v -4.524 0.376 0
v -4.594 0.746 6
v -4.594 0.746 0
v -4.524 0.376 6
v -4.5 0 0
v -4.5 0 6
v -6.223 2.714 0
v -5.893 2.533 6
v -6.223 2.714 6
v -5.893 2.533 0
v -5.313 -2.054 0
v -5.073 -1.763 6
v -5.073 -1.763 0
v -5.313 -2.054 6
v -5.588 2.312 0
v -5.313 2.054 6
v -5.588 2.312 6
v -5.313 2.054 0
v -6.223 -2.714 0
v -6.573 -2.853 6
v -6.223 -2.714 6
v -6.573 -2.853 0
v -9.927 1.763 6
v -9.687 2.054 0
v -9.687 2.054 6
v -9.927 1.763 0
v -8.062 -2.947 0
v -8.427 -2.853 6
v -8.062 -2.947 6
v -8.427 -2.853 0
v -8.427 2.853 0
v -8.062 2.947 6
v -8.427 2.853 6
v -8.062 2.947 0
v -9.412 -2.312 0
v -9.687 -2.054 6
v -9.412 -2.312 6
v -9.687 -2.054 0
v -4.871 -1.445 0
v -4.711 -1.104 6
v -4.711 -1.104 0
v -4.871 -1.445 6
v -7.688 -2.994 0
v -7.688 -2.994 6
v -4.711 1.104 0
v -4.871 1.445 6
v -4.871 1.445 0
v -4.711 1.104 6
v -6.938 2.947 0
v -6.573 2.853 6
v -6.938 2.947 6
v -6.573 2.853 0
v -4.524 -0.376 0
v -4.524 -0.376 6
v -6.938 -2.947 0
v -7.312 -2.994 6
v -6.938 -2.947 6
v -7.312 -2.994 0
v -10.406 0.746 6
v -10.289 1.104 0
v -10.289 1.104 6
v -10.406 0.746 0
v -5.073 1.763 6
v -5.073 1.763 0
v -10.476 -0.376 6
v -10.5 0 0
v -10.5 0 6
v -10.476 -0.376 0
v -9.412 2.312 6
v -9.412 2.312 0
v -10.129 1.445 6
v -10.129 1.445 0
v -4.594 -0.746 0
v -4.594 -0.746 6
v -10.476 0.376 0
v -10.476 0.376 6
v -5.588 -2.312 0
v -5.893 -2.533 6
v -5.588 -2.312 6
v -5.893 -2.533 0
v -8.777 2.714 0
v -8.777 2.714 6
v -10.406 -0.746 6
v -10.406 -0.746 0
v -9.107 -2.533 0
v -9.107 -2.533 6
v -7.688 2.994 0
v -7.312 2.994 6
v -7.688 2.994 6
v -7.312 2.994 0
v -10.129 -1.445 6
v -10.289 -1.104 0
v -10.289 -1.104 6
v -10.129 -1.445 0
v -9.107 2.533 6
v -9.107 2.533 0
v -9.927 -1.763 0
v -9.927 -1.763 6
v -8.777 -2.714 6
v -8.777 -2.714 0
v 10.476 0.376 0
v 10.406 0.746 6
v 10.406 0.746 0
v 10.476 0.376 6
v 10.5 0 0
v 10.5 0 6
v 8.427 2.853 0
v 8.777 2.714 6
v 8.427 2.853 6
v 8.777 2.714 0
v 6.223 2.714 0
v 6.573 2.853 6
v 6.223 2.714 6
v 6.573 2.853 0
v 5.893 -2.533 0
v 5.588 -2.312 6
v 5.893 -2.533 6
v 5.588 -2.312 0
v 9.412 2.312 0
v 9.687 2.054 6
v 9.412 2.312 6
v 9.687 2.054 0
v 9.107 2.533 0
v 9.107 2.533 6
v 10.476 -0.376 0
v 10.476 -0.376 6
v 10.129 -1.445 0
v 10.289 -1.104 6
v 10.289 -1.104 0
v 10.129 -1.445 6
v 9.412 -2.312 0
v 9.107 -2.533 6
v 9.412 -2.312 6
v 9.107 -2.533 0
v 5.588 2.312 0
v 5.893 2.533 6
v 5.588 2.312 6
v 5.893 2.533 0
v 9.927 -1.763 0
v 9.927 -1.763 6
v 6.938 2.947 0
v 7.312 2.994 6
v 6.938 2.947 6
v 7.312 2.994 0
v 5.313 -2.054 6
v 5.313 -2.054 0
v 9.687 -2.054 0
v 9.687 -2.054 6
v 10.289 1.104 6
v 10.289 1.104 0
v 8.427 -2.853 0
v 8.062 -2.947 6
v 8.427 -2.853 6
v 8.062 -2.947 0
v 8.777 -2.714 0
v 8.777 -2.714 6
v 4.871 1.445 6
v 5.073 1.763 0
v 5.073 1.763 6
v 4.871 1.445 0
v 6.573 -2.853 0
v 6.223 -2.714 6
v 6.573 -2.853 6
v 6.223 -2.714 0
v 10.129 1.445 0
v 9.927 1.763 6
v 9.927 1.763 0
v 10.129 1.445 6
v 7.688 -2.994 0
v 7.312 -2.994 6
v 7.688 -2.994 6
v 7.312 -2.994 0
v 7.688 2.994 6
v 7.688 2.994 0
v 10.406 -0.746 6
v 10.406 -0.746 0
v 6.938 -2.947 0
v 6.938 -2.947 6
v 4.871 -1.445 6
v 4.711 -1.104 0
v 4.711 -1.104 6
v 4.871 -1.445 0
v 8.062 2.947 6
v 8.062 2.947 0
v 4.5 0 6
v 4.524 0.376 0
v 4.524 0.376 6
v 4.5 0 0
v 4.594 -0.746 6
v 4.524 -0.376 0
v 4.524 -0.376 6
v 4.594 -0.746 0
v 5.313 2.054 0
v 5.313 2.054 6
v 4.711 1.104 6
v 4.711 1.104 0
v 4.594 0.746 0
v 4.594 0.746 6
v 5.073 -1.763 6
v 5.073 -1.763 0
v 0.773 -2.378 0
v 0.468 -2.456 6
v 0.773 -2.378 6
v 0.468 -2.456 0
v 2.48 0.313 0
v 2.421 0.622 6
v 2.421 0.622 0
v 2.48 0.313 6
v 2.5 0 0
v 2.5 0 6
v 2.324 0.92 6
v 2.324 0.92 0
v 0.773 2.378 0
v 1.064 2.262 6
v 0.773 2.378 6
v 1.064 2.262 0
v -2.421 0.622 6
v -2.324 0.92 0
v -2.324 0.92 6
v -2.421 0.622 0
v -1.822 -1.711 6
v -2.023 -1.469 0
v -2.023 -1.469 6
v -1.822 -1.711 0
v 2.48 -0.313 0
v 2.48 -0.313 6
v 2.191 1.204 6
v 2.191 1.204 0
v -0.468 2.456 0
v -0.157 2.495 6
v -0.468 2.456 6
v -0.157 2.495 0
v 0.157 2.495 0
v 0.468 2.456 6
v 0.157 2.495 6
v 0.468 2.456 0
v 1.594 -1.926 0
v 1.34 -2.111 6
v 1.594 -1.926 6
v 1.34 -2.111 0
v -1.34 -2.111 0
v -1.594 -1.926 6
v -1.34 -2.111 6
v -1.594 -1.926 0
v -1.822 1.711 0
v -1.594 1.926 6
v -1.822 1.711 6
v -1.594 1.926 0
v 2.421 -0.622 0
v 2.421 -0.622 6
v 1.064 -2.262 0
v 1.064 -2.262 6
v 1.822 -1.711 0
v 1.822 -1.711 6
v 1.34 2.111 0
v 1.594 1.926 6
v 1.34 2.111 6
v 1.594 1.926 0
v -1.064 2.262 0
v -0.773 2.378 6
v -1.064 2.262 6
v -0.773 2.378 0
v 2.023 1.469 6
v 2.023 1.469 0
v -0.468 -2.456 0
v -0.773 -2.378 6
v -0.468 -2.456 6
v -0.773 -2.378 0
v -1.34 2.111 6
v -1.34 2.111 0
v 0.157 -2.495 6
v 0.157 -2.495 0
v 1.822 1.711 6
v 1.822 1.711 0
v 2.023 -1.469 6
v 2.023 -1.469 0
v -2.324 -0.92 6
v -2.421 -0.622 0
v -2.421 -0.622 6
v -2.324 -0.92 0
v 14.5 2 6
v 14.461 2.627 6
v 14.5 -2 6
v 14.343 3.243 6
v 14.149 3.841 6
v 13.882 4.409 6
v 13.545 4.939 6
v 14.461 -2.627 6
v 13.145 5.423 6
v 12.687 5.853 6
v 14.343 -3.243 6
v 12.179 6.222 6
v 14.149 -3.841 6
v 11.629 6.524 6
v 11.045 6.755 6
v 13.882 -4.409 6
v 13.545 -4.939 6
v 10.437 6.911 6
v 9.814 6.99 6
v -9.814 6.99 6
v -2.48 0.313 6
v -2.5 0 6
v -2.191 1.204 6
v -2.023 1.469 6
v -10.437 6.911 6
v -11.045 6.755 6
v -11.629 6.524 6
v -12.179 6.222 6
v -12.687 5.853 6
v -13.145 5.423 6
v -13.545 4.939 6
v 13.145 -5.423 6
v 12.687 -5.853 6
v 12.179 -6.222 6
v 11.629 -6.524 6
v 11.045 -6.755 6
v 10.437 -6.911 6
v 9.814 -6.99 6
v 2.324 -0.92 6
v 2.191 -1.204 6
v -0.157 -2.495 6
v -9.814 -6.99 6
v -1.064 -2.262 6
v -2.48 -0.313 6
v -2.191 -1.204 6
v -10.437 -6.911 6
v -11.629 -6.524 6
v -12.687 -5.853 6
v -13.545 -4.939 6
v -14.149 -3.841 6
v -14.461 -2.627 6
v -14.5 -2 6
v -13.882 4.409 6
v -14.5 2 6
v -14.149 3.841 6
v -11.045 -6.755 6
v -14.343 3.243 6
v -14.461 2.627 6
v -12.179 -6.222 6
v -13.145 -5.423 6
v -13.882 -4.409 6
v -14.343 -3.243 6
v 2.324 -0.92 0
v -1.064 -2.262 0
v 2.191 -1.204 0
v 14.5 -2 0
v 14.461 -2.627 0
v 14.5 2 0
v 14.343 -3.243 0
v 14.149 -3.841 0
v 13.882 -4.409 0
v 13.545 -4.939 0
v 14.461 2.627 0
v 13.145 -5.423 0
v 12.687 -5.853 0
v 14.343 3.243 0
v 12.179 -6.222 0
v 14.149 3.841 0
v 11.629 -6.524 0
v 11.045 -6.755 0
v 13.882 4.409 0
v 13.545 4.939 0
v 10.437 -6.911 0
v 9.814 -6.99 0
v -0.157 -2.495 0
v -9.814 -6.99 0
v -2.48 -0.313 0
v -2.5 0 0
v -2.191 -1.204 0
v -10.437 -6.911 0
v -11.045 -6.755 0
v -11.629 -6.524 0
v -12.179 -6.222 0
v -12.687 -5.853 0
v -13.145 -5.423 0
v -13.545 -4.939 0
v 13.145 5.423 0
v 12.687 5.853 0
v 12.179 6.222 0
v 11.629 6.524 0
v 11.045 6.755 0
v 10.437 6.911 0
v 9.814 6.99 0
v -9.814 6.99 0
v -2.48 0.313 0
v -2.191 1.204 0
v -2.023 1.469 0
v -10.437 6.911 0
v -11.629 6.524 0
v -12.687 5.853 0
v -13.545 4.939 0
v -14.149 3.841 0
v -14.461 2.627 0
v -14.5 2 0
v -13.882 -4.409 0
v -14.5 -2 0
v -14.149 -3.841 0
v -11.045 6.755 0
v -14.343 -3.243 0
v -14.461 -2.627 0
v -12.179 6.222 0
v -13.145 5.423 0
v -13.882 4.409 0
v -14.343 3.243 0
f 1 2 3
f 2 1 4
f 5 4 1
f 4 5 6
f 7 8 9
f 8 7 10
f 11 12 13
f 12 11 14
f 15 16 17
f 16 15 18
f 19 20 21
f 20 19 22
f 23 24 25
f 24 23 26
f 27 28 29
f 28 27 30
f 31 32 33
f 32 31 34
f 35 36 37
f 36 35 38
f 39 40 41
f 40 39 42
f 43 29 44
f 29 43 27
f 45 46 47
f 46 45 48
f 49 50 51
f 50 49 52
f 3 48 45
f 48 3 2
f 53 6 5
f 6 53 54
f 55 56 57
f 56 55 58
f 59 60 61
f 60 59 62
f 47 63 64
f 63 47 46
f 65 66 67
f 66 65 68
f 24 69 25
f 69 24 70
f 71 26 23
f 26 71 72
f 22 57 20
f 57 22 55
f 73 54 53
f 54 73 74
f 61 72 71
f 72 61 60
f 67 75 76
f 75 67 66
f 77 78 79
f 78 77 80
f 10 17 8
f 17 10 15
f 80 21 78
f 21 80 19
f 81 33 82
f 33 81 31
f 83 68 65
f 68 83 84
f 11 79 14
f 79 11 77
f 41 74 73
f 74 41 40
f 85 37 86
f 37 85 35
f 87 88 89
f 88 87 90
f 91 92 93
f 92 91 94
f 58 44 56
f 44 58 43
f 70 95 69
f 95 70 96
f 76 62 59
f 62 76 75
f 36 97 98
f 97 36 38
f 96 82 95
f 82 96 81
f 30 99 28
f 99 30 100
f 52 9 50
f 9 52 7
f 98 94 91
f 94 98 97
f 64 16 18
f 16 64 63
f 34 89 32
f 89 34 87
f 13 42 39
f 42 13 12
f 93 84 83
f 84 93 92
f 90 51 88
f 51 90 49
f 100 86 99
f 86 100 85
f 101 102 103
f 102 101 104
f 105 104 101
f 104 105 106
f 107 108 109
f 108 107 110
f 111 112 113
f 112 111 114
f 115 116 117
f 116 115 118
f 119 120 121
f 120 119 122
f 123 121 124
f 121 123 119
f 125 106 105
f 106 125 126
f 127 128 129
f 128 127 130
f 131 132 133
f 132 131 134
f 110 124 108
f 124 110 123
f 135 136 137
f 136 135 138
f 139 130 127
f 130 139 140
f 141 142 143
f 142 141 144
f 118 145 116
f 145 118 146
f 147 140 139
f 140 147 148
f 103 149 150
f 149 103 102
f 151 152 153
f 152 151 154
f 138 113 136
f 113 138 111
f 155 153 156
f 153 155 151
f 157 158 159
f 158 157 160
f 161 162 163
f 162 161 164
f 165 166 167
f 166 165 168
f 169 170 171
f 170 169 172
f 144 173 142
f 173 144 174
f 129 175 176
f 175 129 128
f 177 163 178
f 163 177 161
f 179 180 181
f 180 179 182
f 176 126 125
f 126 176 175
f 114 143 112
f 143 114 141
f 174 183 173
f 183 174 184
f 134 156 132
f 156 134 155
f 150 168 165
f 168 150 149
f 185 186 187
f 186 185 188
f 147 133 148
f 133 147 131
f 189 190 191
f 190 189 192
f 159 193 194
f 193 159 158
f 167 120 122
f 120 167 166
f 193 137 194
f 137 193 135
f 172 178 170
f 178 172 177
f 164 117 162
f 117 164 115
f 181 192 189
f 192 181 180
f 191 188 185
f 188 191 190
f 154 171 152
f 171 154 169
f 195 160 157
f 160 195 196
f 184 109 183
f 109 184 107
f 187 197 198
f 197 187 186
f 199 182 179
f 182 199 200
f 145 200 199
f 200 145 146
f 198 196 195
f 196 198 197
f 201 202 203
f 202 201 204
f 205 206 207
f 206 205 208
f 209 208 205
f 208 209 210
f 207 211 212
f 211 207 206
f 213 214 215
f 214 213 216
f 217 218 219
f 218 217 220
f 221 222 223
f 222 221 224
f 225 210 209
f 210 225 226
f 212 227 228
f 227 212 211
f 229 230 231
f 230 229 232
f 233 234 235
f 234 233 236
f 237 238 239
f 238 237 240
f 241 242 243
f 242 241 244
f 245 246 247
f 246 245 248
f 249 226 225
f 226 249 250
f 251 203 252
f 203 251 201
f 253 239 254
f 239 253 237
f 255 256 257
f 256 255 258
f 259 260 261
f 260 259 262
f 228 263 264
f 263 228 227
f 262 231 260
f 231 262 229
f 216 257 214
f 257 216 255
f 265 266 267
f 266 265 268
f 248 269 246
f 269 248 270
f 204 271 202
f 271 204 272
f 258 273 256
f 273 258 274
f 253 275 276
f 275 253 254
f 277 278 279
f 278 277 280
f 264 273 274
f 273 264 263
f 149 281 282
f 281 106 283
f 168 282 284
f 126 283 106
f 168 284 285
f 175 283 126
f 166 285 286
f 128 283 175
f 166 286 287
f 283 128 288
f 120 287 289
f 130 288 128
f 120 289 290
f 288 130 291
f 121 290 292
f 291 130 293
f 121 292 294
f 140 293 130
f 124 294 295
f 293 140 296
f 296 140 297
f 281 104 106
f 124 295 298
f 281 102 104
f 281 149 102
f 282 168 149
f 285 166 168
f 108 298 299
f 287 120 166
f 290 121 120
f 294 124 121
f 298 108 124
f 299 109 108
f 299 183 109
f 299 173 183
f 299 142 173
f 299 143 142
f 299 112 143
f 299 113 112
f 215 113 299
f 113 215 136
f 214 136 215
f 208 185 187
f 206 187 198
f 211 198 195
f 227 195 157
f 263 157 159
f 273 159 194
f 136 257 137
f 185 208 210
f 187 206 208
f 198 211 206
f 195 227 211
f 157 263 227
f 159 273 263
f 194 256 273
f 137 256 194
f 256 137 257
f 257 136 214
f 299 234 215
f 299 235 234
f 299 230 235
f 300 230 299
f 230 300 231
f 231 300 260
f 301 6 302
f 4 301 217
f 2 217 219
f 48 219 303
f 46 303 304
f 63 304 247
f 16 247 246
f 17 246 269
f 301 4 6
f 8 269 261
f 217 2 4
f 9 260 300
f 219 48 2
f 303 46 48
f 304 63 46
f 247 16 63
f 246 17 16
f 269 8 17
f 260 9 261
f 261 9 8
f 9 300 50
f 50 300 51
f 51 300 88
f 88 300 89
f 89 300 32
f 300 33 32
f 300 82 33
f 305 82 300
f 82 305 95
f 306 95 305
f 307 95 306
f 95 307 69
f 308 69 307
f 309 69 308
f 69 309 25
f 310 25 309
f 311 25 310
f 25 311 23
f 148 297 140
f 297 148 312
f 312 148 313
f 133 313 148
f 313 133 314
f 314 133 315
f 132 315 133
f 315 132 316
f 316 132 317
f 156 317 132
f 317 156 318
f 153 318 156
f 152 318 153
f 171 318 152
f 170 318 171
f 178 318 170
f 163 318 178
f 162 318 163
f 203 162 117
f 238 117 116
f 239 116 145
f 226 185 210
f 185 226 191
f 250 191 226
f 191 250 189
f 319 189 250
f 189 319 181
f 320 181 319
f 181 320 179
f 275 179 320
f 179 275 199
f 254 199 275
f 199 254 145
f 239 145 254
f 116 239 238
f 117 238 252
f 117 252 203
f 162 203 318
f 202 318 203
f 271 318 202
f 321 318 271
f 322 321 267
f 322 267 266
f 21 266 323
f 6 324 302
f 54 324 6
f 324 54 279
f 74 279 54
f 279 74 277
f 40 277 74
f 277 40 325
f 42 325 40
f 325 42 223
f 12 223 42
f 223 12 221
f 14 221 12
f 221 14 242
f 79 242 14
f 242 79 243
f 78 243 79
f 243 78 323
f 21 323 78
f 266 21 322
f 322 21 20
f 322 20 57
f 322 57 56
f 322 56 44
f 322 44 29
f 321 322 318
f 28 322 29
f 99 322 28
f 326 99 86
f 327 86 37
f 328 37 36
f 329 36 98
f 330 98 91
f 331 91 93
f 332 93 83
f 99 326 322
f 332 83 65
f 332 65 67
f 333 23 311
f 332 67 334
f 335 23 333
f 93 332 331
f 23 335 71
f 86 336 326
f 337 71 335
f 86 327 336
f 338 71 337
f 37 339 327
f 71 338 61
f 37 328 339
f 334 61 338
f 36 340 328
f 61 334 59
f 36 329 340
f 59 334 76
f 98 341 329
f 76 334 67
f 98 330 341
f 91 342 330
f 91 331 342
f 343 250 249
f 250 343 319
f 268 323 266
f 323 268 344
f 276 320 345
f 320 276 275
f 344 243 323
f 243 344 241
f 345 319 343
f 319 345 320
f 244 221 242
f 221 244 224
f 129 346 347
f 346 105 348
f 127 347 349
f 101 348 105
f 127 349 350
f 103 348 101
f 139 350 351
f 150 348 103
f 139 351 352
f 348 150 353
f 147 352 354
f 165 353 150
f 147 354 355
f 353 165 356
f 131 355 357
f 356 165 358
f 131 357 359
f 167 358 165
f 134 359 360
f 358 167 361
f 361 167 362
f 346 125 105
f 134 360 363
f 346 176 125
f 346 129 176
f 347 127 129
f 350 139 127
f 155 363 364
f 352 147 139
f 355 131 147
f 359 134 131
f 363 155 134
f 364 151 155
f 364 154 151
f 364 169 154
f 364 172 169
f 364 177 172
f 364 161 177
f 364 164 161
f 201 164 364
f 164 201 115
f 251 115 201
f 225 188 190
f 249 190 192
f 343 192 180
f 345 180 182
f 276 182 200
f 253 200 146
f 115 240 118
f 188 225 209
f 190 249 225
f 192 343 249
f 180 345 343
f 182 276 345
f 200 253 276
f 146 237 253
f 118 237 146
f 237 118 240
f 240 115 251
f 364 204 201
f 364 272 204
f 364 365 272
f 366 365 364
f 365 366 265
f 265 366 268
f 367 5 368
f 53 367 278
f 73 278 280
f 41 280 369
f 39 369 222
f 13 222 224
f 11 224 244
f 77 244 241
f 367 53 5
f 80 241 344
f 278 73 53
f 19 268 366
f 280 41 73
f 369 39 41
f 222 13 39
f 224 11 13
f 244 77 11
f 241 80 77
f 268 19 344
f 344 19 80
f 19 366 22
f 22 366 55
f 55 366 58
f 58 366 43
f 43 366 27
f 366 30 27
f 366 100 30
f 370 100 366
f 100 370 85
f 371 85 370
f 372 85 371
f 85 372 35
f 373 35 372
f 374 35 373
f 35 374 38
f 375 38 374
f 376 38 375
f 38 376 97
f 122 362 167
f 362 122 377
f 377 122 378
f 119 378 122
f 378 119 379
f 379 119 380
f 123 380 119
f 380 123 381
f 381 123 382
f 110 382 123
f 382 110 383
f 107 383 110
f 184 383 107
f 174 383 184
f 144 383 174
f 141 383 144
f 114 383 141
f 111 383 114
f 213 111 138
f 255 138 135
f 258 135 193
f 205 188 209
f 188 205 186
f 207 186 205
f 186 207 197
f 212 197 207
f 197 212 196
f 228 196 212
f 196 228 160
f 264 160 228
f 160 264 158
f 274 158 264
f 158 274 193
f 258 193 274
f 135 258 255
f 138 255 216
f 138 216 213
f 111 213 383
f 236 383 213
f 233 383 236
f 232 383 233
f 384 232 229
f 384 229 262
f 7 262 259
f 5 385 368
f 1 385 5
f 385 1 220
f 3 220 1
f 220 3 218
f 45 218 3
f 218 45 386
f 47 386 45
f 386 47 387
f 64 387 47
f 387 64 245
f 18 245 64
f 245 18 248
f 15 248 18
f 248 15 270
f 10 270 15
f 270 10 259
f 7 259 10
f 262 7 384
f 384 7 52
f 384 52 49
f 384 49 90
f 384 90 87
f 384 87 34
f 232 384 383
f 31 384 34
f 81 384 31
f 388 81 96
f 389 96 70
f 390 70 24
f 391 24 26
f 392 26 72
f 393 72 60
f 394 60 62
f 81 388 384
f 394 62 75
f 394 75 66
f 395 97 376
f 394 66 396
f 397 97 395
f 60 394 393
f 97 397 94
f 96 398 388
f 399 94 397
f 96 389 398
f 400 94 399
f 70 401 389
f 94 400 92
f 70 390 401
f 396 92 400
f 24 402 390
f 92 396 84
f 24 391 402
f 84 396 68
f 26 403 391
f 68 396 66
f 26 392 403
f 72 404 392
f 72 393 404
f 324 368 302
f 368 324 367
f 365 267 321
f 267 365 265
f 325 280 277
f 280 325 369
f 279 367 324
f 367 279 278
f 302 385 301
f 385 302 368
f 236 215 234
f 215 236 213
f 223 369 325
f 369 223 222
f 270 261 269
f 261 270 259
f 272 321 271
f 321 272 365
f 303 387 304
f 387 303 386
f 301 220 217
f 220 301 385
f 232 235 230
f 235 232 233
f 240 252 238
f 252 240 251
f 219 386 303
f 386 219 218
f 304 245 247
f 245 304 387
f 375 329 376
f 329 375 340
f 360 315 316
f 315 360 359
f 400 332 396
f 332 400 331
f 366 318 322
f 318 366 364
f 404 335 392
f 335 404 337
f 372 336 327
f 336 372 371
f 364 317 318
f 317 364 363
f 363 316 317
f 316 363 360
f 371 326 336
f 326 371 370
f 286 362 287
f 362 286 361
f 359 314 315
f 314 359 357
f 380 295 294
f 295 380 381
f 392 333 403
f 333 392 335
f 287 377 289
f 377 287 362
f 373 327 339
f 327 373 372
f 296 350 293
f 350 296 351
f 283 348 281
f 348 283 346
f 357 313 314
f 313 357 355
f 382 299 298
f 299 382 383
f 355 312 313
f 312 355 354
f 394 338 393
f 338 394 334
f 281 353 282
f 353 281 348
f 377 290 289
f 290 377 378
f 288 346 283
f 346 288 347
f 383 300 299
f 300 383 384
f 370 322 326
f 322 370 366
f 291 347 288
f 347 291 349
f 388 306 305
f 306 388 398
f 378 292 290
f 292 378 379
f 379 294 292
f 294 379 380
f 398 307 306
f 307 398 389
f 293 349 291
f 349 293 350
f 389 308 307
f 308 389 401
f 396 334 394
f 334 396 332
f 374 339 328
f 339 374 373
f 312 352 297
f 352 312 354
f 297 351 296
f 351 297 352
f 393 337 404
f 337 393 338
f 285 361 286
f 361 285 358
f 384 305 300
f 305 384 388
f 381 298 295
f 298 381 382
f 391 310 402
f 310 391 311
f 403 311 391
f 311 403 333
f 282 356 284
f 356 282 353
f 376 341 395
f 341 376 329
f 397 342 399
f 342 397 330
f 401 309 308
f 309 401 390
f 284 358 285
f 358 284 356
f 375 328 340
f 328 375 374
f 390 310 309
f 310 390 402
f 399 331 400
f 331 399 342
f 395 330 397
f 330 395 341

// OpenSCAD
$fn = 50;


difference() {
	union() {
		hull() {
			translate(v = [-9.5000000000, 2.0000000000, 0]) {
				cylinder(h = 6, r = 5);
			}
			translate(v = [9.5000000000, 2.0000000000, 0]) {
				cylinder(h = 6, r = 5);
			}
			translate(v = [-9.5000000000, -2.0000000000, 0]) {
				cylinder(h = 6, r = 5);
			}
			translate(v = [9.5000000000, -2.0000000000, 0]) {
				cylinder(h = 6, r = 5);
			}
		}
	}
	union() {
		#translate(v = [-7.5000000000, 0.0000000000, 0]) {
			cylinder(h = 6, r = 3.0000000000);
		}
		#translate(v = [7.5000000000, 0.0000000000, 0]) {
			cylinder(h = 6, r = 3.0000000000);
		}
		#translate(v = [-7.5000000000, 0.0000000000, -100.0000000000]) {
			cylinder(h = 200, r = 3.0000000000);
		}
		#translate(v = [-7.5000000000, 0.0000000000, -100.0000000000]) {
			cylinder(h = 200, r = 3.0000000000);
		}
		#translate(v = [7.5000000000, 0.0000000000, -100.0000000000]) {
			cylinder(h = 200, r = 3.0000000000);
		}
		#translate(v = [7.5000000000, 0.0000000000, -100.0000000000]) {
			cylinder(h = 200, r = 3.0000000000);
		}
		#translate(v = [-7.5000000000, 0.0000000000, 0]) {
			cylinder(h = 6, r = 1.5000000000);
		}
		#translate(v = [7.5000000000, 0.0000000000, 0]) {
			cylinder(h = 6, r = 1.5000000000);
		}
		#translate(v = [-7.5000000000, 0.0000000000, 0]) {
			cylinder(h = 6, r = 1.5000000000);
		}
		#translate(v = [7.5000000000, 0.0000000000, 0]) {
			cylinder(h = 6, r = 1.5000000000);
		}
		#translate(v = [-7.5000000000, 0.0000000000, 0]) {
			cylinder(h = 6, r = 1.5000000000);
		}
		#translate(v = [7.5000000000, 0.0000000000, 0]) {
			cylinder(h = 6, r = 1.5000000000);
		}
		#cylinder(h = 6, r = 2.5000000000);
	}
}
